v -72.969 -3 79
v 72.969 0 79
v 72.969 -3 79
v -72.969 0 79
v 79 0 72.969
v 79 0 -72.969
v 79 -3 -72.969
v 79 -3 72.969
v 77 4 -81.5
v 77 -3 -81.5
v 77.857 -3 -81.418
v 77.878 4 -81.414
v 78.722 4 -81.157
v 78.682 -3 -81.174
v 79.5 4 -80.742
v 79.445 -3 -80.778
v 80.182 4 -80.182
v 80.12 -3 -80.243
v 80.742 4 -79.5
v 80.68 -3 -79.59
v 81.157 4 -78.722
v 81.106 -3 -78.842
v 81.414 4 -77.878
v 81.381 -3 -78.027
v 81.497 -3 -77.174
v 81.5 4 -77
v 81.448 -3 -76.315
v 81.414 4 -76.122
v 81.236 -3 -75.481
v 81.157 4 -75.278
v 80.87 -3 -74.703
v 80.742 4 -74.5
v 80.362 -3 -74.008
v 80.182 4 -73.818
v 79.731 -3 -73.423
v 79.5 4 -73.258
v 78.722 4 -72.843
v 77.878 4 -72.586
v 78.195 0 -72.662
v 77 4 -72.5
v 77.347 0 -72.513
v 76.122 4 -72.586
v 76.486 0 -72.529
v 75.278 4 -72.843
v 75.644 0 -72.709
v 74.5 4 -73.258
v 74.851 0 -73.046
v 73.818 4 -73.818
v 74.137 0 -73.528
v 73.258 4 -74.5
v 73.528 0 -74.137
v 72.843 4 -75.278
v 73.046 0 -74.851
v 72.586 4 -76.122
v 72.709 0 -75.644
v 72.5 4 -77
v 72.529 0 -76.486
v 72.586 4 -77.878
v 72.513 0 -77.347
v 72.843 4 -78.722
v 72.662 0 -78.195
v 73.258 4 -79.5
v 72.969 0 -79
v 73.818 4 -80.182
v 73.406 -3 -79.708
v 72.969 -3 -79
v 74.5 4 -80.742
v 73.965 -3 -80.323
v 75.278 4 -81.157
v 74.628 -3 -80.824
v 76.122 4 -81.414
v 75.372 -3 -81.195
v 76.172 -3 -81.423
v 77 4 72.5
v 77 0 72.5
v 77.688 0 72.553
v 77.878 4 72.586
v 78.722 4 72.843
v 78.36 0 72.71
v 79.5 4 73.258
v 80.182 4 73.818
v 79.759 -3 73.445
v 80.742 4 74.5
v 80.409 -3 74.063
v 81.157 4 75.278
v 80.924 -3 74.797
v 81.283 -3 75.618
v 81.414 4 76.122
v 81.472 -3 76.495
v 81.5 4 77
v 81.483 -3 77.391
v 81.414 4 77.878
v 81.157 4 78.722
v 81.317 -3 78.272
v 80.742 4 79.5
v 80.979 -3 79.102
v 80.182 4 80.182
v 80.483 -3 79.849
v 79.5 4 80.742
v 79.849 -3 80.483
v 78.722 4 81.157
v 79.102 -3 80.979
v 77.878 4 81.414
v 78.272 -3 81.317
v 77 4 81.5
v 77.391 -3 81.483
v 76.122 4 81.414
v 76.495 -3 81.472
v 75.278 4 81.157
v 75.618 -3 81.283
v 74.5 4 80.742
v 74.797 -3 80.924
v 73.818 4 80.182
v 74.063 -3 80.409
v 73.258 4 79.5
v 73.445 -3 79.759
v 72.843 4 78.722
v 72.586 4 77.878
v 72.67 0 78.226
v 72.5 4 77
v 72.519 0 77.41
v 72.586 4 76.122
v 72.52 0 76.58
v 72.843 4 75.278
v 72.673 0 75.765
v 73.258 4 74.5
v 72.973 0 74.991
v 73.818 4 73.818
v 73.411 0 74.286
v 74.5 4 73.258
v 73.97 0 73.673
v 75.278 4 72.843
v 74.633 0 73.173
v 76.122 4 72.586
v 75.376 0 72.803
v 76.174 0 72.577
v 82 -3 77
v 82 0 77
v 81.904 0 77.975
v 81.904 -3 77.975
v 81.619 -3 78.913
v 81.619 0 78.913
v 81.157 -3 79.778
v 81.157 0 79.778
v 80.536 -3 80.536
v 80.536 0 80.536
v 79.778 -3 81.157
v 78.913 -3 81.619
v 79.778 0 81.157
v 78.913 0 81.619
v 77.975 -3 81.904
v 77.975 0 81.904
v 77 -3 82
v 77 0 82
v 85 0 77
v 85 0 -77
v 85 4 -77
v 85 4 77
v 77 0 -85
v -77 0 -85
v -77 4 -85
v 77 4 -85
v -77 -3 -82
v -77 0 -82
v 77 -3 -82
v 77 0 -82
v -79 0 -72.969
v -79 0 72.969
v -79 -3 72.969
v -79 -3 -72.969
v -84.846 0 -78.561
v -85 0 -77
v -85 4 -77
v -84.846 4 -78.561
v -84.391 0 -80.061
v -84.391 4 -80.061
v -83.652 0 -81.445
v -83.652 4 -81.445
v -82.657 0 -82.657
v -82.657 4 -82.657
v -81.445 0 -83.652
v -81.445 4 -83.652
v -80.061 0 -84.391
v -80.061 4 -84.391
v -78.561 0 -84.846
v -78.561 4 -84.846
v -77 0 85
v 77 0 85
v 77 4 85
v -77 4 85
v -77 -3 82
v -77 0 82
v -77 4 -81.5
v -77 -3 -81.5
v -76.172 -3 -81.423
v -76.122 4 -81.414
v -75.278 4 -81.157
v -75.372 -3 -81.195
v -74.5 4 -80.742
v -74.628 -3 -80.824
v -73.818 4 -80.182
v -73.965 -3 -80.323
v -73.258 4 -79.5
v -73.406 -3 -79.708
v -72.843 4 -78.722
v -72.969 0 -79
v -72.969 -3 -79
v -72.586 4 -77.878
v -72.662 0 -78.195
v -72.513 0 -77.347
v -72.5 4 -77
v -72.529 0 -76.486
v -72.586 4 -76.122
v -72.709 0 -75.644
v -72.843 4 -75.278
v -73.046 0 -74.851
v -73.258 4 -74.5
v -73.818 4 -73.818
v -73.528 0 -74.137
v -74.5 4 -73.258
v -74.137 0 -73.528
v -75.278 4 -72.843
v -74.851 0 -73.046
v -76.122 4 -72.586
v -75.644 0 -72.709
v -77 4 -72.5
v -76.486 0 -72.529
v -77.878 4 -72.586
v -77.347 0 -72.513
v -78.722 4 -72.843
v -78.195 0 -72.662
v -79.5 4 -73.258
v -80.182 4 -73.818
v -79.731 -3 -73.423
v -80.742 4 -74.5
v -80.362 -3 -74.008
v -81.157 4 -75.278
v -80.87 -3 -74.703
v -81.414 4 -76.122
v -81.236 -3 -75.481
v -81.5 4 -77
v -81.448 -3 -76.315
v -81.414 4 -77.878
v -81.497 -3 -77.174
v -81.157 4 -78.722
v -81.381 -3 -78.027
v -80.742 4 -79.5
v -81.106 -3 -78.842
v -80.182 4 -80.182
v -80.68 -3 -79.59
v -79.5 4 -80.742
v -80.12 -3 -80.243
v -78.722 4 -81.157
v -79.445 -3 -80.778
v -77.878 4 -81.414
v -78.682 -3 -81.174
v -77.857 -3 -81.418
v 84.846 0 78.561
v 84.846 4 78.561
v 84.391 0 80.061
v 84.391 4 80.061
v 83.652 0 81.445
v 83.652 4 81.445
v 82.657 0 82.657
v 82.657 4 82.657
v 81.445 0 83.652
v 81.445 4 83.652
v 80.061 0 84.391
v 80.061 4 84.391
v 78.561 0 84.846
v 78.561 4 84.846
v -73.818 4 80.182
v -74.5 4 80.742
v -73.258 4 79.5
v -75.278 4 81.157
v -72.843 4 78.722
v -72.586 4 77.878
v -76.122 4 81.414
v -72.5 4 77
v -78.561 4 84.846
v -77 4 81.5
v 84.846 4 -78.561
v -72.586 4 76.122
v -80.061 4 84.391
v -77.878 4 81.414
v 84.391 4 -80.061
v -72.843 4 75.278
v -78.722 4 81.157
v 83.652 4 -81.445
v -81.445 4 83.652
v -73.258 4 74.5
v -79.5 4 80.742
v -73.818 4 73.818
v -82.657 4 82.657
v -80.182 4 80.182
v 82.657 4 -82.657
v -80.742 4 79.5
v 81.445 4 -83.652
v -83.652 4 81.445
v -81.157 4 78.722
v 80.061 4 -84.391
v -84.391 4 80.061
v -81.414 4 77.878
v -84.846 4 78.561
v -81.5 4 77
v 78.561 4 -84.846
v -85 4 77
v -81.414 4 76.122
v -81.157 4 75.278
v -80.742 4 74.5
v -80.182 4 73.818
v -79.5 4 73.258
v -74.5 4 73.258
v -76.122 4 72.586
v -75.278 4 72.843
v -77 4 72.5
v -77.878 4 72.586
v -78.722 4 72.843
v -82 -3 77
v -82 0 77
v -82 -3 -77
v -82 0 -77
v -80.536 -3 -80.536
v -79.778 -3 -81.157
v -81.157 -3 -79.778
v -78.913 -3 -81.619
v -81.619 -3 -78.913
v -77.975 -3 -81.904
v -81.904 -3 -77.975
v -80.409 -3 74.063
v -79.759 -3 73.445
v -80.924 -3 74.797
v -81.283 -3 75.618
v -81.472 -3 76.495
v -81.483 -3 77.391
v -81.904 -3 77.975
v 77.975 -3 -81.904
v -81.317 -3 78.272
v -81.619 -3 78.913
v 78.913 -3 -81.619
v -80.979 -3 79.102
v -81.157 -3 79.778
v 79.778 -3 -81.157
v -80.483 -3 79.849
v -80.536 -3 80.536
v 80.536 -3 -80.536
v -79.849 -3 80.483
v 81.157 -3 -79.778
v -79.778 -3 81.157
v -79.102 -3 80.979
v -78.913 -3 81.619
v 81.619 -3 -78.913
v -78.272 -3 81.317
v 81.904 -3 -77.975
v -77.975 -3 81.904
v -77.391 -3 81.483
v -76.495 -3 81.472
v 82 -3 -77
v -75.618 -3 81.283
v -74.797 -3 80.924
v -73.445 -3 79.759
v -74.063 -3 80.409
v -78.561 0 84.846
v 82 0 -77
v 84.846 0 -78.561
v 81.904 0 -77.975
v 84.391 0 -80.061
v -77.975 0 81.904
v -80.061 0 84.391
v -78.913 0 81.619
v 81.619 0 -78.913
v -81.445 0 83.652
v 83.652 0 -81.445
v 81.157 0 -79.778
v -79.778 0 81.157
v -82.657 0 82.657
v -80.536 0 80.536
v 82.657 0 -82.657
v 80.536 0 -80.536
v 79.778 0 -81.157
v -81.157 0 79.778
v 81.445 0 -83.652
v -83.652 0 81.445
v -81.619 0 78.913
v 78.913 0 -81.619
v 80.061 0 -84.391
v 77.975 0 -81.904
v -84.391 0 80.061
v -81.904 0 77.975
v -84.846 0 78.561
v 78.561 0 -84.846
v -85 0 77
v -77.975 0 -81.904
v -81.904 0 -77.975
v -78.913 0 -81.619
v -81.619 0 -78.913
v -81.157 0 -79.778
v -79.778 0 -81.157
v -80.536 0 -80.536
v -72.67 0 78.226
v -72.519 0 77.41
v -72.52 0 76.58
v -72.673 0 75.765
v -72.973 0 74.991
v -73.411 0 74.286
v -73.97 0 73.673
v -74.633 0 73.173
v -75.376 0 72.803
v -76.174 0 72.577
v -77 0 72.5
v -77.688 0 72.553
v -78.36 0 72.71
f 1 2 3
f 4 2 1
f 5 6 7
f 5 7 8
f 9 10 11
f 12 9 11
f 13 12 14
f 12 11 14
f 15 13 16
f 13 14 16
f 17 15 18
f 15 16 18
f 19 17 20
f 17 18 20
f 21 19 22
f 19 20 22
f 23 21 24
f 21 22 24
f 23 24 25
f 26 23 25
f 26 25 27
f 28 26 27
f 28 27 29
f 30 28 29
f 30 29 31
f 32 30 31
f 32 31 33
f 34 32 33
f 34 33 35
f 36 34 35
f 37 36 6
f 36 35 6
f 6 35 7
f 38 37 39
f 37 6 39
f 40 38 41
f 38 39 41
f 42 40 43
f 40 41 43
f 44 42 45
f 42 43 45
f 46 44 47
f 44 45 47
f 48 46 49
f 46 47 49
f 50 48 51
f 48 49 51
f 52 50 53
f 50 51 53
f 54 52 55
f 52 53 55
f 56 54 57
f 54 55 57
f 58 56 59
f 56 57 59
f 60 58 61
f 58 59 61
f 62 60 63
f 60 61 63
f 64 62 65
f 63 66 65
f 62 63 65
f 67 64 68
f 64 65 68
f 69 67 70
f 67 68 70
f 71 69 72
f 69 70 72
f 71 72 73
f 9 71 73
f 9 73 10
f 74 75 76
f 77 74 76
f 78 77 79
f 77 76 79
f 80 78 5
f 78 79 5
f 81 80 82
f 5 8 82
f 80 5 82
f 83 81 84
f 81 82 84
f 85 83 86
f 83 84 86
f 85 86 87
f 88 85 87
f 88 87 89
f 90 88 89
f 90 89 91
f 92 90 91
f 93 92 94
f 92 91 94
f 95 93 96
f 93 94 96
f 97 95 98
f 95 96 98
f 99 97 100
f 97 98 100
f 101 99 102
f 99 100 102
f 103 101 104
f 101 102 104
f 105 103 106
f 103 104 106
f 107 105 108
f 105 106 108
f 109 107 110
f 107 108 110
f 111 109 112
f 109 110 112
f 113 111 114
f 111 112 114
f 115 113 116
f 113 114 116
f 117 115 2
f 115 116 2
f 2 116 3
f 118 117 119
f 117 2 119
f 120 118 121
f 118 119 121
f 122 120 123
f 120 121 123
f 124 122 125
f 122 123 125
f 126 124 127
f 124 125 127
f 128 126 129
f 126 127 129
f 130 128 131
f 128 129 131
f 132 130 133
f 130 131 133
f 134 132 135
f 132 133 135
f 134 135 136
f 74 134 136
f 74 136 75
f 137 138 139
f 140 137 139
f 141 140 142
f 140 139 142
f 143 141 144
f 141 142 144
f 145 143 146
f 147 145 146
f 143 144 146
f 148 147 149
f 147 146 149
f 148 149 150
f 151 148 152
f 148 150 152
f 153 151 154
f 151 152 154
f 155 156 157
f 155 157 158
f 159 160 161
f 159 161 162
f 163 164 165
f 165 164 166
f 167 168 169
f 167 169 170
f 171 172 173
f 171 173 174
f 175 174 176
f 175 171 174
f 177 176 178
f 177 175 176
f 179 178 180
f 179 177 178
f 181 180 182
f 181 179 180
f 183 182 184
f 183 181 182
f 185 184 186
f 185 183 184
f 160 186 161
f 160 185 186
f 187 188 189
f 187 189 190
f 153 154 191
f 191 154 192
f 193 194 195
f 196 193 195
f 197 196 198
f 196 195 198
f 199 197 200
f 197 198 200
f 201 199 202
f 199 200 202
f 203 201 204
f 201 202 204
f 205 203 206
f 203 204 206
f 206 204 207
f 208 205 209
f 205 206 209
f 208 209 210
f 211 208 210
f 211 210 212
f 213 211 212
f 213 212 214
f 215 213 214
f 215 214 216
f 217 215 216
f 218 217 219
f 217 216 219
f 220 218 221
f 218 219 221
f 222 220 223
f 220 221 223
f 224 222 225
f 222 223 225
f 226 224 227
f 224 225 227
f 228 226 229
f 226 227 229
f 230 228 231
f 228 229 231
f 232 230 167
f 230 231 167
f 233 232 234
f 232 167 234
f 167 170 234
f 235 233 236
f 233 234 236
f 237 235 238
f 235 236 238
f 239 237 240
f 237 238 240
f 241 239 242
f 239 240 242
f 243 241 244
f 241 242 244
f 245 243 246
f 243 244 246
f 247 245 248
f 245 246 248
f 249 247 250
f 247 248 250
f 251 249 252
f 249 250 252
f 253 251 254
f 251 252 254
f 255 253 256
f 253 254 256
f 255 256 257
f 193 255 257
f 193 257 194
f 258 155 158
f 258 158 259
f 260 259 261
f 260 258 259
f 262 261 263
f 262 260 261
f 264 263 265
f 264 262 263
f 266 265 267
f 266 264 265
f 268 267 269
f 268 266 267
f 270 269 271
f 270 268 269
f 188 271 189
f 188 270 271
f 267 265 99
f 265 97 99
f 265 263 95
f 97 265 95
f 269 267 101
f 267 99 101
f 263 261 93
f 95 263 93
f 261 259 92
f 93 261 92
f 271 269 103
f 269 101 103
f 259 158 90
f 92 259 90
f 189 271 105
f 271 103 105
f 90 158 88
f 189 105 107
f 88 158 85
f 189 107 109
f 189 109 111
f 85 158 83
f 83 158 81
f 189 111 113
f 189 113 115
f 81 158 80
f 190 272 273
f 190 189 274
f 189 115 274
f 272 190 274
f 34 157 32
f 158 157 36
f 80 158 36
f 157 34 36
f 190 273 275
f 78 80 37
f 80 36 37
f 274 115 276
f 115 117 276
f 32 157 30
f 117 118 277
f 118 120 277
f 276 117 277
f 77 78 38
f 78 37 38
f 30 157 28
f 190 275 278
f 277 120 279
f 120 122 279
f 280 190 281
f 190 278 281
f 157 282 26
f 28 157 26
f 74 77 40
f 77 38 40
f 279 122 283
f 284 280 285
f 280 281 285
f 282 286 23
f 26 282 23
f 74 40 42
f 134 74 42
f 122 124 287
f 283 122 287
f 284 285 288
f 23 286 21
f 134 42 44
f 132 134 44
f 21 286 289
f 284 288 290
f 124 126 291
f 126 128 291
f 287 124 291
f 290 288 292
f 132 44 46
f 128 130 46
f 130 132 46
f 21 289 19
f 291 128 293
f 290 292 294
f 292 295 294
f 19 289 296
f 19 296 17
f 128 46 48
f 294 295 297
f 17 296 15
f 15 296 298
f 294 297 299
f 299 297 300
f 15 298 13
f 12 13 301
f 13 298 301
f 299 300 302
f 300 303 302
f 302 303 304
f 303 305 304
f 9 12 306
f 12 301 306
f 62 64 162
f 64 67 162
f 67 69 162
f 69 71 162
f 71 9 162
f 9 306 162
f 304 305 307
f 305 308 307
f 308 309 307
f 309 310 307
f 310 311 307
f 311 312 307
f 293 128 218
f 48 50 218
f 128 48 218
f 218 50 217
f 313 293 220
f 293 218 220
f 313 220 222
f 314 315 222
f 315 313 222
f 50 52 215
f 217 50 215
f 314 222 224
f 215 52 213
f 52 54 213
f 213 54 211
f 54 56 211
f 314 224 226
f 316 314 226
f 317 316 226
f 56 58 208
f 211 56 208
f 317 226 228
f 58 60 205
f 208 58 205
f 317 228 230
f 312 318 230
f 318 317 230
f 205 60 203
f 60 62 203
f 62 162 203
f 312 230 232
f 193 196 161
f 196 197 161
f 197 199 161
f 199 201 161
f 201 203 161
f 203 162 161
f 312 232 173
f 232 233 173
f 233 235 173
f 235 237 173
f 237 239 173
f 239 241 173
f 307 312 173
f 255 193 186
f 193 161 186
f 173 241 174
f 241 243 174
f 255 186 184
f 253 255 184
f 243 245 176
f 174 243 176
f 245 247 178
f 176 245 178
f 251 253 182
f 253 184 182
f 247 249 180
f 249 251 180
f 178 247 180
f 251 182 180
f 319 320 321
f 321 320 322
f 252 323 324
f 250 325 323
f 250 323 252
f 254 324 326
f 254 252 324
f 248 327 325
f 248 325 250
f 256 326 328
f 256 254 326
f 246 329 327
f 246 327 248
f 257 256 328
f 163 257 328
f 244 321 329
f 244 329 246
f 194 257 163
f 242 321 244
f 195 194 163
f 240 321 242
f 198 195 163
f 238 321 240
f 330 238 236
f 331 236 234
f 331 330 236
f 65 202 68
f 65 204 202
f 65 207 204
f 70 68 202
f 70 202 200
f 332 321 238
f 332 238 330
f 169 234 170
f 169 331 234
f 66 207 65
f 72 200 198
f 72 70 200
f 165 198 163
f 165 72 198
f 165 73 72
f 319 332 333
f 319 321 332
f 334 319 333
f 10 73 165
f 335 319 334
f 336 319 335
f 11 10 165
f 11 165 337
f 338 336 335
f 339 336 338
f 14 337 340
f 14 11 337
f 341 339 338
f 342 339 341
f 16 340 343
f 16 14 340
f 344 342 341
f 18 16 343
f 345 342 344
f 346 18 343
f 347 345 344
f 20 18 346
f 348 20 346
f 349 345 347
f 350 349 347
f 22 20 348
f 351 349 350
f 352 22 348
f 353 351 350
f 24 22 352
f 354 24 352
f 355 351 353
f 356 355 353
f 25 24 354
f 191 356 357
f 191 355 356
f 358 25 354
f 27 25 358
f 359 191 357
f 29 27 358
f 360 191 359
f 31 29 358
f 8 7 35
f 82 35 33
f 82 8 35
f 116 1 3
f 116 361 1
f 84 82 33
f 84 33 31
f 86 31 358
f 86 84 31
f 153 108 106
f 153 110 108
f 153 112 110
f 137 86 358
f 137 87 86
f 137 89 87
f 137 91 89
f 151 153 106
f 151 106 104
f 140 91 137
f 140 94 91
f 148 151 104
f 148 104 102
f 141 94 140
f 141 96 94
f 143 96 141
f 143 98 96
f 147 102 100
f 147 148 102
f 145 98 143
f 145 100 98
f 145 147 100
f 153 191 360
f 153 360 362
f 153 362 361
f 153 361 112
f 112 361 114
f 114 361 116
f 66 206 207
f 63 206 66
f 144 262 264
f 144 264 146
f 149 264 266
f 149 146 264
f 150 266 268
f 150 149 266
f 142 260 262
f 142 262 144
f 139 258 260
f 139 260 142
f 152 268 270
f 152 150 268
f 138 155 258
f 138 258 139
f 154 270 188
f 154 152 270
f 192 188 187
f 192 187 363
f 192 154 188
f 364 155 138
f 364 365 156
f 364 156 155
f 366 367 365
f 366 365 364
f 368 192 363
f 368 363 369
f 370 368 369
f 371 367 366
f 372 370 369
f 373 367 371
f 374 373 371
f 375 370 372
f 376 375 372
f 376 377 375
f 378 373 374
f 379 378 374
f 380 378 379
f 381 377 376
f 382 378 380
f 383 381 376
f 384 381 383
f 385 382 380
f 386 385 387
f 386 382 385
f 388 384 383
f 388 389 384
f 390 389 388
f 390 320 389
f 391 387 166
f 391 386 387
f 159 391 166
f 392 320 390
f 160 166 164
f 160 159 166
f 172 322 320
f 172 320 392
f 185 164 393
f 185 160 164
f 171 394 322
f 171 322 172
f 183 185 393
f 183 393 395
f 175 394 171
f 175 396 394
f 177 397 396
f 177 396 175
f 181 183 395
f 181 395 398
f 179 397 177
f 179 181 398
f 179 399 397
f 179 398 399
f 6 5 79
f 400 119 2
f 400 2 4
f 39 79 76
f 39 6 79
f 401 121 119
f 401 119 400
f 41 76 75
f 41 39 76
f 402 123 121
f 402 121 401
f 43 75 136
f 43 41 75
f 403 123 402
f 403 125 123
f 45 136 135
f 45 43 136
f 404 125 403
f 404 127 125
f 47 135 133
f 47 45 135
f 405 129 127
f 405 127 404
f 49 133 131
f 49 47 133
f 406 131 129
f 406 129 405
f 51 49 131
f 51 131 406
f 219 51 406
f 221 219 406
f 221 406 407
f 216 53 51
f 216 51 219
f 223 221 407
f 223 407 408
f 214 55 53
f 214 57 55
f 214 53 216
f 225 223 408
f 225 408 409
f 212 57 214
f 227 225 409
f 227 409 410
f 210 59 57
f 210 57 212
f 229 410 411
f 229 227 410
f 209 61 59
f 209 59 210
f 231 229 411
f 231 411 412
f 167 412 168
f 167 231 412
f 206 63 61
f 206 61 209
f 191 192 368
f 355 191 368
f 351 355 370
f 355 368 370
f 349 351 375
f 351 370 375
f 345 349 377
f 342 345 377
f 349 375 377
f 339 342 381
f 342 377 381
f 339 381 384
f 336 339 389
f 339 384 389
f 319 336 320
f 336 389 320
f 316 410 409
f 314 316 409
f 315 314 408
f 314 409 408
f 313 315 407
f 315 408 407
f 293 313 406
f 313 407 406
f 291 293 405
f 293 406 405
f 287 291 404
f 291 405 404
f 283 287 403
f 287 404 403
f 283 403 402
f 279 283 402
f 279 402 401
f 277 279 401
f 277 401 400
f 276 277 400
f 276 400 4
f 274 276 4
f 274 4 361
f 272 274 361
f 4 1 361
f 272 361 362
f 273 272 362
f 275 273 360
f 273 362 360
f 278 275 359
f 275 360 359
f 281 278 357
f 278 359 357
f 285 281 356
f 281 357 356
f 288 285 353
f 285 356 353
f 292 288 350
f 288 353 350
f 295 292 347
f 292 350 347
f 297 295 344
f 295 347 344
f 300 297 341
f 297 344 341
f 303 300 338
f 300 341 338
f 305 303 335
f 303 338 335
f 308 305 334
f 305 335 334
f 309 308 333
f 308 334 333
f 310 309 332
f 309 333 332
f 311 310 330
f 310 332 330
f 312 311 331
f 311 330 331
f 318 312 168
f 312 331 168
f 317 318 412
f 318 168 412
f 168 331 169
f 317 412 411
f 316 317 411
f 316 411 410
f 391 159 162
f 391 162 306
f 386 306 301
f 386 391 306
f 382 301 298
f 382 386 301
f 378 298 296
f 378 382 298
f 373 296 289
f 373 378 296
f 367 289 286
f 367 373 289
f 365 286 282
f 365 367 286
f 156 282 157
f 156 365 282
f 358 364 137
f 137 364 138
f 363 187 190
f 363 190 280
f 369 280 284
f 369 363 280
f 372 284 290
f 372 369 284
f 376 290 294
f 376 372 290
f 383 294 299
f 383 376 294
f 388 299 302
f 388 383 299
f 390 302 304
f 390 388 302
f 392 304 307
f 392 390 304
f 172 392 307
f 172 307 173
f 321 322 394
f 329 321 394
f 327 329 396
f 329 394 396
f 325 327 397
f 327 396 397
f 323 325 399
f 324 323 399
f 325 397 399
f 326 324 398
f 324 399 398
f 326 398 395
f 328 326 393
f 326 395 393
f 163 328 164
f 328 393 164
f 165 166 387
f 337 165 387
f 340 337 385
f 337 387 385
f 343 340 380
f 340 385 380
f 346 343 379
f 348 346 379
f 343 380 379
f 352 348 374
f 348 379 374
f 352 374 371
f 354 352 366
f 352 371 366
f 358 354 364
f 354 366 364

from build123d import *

# Parameters (mm, degrees)
BOSS_EXTRUDE1_DEPTH = 4
BOSS_EXTRUDE2_DEPTH = 3
SKETCH4_R           = 4.5
CUT_EXTRUDE2_DEPTH  = 121.411793442


with BuildPart() as part:
    # Sketch1 → Boss-Extrude1 (new body)
    with BuildSketch(Plane(origin=(0, 0, 0), x_dir=(1, 0, 0), z_dir=(0, 1, 0))):
        with BuildLine():
            Line((-77, 85), (77, 85))
            ThreePointArc((77, 85), (82.656854249, 82.656854249), (85, 77))
            Line((85, 77), (85, -77))
            ThreePointArc((85, -77), (82.656854249, -82.656854249), (77, -85))
            Line((77, -85), (-77, -85))
            ThreePointArc((-77, -85), (-82.656854249, -82.656854249), (-85, -77))
            Line((-85, -77), (-85, 77))
            ThreePointArc((-85, 77), (-82.656854249, 82.656854249), (-77, 85))
        make_face()
    extrude(amount=BOSS_EXTRUDE1_DEPTH)

    # Sketch2 → Boss-Extrude2 (add)
    with BuildSketch(Plane.XZ):
        with BuildLine():
            Line((77, 82), (-77, 82))
            ThreePointArc((-77, 82), (-80.535533906, 80.535533906), (-82, 77))
            Line((-82, 77), (-82, -77))
            ThreePointArc((-82, -77), (-80.535533906, -80.535533906), (-77, -82))
            Line((-77, -82), (77, -82))
            ThreePointArc((77, -82), (80.535533906, -80.535533906), (82, -77))
            Line((82, -77), (82, 77))
            ThreePointArc((82, 77), (80.535533906, 80.535533906), (77, 82))
        make_face()
        with BuildLine():
            ThreePointArc((79, 77), (78.414213562, 78.414213562), (77, 79))
            Line((77, 79), (-77, 79))
            ThreePointArc((-77, 79), (-78.414213562, 78.414213562), (-79, 77))
            Line((-79, 77), (-79, -77))
            ThreePointArc((-79, -77), (-78.414213562, -78.414213562), (-77, -79))
            Line((-77, -79), (77, -79))
            ThreePointArc((77, -79), (78.414213562, -78.414213562), (79, -77))
            Line((79, -77), (79, 77))
        make_face(mode=Mode.SUBTRACT)
    extrude(amount=BOSS_EXTRUDE2_DEPTH)

    # Sketch4 → Cut-Extrude2 (cut, through all)
    with BuildSketch(Plane.XZ.offset(3)):
        with Locations(Location((77, 77, 0), (0, 0, 270))):
            Circle(SKETCH4_R)
        with Locations(Location((77, -77, 0), (0, 0, 270))):
            Circle(SKETCH4_R)
        with Locations(Location((-77, -77, 0), (0, 0, 270))):
            Circle(SKETCH4_R)
        with Locations(Location((-77, 77, 0), (0, 0, 270))):
            Circle(SKETCH4_R)
    extrude(amount=-CUT_EXTRUDE2_DEPTH, mode=Mode.SUBTRACT)


solid = part.part
